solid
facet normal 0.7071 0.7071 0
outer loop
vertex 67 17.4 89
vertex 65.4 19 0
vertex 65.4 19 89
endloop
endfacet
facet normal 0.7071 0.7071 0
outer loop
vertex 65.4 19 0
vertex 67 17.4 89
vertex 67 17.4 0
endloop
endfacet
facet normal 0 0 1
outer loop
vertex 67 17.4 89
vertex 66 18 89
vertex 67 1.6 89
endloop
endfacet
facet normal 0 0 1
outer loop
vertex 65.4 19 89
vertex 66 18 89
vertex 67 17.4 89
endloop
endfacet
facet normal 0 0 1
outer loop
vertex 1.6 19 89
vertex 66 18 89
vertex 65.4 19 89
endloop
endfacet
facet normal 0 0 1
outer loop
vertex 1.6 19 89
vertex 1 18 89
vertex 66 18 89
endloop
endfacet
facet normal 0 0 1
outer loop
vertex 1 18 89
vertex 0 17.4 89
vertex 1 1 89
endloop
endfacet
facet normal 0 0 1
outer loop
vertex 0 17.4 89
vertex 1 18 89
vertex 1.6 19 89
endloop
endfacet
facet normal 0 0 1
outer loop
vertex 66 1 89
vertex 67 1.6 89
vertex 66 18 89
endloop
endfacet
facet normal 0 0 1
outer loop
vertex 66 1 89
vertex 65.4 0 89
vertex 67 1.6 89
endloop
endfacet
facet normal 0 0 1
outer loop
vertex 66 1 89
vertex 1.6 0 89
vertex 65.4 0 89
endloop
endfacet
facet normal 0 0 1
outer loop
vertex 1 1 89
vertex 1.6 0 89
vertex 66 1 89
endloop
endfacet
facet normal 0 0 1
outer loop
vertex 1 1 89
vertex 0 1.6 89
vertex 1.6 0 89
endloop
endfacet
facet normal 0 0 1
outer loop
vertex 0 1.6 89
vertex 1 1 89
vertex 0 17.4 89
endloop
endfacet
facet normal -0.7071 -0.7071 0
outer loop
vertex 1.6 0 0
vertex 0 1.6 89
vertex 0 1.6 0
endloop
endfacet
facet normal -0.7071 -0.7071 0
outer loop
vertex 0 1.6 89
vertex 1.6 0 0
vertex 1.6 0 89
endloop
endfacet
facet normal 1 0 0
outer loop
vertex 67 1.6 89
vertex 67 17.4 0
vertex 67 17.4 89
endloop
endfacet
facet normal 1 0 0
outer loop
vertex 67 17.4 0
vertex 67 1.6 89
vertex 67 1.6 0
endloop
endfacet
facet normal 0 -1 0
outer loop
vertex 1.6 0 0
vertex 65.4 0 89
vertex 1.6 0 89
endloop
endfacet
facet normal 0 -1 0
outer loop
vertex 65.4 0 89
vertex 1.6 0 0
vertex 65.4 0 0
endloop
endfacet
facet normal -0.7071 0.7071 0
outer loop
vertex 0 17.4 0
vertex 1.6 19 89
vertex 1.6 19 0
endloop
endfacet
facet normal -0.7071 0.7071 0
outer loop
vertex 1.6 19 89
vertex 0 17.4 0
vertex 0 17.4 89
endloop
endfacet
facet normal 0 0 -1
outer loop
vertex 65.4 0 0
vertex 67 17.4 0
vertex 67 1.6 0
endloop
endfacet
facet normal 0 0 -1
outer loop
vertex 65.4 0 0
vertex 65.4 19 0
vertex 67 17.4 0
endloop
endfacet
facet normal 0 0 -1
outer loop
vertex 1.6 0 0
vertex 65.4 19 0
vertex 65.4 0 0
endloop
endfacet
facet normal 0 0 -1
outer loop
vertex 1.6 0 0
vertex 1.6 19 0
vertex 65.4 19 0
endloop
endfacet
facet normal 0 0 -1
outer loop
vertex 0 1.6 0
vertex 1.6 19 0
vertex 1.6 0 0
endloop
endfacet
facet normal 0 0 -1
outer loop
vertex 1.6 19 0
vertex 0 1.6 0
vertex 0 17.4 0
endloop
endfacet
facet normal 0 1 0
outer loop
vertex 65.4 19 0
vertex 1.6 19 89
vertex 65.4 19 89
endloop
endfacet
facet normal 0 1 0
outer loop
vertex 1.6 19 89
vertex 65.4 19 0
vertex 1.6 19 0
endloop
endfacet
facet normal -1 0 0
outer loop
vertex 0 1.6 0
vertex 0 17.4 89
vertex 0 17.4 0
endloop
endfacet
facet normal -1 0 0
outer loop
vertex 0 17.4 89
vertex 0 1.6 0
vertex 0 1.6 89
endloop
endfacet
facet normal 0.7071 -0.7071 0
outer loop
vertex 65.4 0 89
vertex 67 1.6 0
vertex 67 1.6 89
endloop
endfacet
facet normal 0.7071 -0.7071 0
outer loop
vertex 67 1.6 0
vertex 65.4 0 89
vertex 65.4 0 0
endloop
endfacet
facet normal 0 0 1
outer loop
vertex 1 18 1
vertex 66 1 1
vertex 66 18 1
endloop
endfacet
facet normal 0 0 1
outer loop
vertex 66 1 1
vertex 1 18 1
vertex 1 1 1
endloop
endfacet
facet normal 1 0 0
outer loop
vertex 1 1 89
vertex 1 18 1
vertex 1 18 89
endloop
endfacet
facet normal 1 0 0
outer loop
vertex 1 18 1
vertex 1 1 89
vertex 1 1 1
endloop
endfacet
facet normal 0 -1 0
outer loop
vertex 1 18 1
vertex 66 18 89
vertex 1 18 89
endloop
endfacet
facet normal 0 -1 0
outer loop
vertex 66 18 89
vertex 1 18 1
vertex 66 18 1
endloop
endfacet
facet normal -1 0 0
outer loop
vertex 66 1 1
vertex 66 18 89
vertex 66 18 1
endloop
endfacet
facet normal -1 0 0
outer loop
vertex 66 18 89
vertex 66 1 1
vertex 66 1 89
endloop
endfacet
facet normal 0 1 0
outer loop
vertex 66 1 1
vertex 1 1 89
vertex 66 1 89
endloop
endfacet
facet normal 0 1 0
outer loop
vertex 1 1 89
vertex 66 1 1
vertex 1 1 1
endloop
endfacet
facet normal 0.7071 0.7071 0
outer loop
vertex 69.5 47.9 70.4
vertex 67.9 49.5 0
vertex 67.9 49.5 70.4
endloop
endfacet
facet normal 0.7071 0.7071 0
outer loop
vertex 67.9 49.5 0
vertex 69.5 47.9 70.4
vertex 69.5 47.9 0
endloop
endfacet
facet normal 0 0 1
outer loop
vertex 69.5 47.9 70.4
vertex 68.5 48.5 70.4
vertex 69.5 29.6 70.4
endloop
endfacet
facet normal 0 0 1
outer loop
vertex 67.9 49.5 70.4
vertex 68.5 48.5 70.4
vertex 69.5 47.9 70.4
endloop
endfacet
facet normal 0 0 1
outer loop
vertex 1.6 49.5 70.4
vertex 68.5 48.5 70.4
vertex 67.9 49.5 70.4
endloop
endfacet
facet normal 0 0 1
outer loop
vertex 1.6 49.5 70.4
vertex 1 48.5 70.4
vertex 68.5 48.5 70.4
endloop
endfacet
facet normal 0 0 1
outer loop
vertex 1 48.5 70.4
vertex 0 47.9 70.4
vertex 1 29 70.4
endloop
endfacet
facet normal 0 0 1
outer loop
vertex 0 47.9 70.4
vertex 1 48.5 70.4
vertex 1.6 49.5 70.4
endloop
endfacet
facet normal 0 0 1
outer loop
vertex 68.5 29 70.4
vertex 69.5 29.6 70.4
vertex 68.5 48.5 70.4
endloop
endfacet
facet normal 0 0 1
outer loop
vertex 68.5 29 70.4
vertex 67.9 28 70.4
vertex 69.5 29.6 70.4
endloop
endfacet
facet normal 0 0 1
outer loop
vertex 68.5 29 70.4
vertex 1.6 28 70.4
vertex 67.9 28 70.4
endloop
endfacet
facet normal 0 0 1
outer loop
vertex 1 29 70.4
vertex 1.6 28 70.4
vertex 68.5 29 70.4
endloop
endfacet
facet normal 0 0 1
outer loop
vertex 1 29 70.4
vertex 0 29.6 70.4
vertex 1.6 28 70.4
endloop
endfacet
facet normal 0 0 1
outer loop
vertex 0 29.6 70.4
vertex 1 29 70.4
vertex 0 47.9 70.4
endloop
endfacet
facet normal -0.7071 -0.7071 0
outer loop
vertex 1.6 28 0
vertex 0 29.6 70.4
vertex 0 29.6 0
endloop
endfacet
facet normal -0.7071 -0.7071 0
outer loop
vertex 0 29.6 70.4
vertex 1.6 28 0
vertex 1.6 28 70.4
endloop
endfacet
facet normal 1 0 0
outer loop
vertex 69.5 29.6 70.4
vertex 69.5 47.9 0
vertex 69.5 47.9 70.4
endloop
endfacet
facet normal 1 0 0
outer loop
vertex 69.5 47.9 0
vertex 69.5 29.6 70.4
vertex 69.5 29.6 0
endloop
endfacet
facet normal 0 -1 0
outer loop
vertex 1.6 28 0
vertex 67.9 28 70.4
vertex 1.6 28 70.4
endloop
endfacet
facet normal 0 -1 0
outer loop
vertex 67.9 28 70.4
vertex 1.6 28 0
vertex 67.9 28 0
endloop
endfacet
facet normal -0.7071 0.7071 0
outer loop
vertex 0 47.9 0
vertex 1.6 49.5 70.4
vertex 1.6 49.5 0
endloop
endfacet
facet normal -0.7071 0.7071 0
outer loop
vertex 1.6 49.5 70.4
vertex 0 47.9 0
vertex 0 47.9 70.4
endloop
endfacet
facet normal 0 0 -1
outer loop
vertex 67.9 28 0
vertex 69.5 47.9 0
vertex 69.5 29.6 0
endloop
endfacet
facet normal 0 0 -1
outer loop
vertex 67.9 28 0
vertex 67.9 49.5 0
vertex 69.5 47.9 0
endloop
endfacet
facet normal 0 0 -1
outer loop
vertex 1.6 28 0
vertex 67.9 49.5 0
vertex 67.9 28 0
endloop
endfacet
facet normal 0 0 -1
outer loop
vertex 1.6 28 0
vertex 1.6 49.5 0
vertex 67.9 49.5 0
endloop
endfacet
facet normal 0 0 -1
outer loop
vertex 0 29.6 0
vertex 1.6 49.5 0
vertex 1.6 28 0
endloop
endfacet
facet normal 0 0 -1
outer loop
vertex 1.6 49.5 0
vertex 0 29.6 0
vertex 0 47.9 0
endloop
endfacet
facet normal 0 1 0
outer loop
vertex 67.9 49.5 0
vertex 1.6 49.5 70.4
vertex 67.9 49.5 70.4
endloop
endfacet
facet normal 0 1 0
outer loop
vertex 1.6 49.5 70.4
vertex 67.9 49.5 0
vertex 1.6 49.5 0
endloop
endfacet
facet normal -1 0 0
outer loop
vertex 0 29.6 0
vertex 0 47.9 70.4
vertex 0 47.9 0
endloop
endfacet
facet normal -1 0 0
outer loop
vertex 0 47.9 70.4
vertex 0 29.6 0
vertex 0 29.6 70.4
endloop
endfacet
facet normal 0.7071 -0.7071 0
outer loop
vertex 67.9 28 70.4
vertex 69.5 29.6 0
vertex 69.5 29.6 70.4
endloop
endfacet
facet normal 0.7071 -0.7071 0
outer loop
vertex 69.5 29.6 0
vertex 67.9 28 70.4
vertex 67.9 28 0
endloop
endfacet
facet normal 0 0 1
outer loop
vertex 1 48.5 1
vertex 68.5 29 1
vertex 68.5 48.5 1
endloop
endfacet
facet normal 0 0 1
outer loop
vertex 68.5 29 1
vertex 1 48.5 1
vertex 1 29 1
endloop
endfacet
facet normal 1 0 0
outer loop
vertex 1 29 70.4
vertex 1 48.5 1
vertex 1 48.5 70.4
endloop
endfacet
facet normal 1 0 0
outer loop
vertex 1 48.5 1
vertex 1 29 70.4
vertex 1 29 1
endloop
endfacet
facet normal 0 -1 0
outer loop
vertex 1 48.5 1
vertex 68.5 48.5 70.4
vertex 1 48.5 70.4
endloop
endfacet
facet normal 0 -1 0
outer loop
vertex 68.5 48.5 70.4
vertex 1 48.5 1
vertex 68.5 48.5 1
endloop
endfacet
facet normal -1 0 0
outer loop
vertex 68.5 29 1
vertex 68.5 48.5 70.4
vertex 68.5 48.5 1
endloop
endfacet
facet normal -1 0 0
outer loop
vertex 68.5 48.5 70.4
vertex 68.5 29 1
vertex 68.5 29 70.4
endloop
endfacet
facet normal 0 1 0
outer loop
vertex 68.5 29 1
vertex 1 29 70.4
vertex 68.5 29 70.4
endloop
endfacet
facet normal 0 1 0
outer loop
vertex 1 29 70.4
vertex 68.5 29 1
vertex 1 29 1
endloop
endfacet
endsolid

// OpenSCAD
/* Scaling card (or anything, really) box  */

// standard 52-card deck is default

/*
 *
 * Future improvements
 * - Something to hold it together. Maybe an indentation on one case and a nub
 *   on the other
 * - Abiliity to automatically generate 1mm false cards as part of the STL to act
 *   as spacers (and make box automatically size to account for them)
 * - Automatic embossing of text to note what's stored
 *   
 */

/* [Two Part Box] */

// Width of cards (shorter side) (mm)
cardWidth = 64; // [1:300]

// Length of cards (longer side) (mm)
cardLength = 88; // [1:300]

// Thickness of deck (don't squeeze too tight) (mm)
deckThickness = 16; // [1:300]

// Thickness of box walls
boxThickness = 1; // [1:10]

// Margin between boxes (mm) - too low and they won't go together or come apart, so be careful
innerMargin = 0.5; // mm of "space" between boxes when together

// ignore variable values
cornerRadius = boxThickness * 1.6;
lowerBoxLength = cardLength * 1;
upperBoxLength = cardLength * 0.8;
deckWiggle = 1; // mm of extra space inside box
distanceBetweenModels = 10; // spacing between models in STL

difference() 
{ 
  outerWidth = cardWidth + boxThickness*2 + deckWiggle;
  outerLength = lowerBoxLength + deckWiggle;
  outerDepth = deckThickness + boxThickness*2 + deckWiggle;
  
  innerWidth = cardWidth + deckWiggle;
  innerLength = lowerBoxLength + deckWiggle;
  innerDepth = deckThickness + deckWiggle;
  
  roundedRect([outerWidth, outerDepth, outerLength], cornerRadius); 
  translate([boxThickness, boxThickness, boxThickness]) {
    rect([innerWidth, innerDepth, innerLength]);
  }
} 

yoffset = deckThickness + boxThickness * 2 + distanceBetweenModels;

// move the new center to the right for the new model
translate([0, yoffset]) { 
  difference() {
    
    innerWidth = cardWidth + boxThickness * 2 + deckWiggle + innerMargin;
    innerLength = lowerBoxLength + deckWiggle + innerMargin;
    innerDepth = deckThickness + boxThickness * 2 + deckWiggle + innerMargin;
    
    outerWidth = innerWidth + boxThickness * 2;
    outerLength = upperBoxLength;
    outerDepth = innerDepth + boxThickness * 2;
    
    roundedRect([outerWidth, outerDepth, outerLength], cornerRadius);
    translate([boxThickness, boxThickness, boxThickness]) {
      rect([innerWidth, innerDepth, innerLength]);
    }
  }
}

module roundedRect(size, radius, center)  // more elegant version 
 linear_extrude(height = size.z, center = center) 
  offset(radius) offset(-radius) 
   square([size.x, size.y], center = center); 

module rect(size, center)
  linear_extrude(height = size.z, center = center)
    square([size.x, size.y], center = center);
